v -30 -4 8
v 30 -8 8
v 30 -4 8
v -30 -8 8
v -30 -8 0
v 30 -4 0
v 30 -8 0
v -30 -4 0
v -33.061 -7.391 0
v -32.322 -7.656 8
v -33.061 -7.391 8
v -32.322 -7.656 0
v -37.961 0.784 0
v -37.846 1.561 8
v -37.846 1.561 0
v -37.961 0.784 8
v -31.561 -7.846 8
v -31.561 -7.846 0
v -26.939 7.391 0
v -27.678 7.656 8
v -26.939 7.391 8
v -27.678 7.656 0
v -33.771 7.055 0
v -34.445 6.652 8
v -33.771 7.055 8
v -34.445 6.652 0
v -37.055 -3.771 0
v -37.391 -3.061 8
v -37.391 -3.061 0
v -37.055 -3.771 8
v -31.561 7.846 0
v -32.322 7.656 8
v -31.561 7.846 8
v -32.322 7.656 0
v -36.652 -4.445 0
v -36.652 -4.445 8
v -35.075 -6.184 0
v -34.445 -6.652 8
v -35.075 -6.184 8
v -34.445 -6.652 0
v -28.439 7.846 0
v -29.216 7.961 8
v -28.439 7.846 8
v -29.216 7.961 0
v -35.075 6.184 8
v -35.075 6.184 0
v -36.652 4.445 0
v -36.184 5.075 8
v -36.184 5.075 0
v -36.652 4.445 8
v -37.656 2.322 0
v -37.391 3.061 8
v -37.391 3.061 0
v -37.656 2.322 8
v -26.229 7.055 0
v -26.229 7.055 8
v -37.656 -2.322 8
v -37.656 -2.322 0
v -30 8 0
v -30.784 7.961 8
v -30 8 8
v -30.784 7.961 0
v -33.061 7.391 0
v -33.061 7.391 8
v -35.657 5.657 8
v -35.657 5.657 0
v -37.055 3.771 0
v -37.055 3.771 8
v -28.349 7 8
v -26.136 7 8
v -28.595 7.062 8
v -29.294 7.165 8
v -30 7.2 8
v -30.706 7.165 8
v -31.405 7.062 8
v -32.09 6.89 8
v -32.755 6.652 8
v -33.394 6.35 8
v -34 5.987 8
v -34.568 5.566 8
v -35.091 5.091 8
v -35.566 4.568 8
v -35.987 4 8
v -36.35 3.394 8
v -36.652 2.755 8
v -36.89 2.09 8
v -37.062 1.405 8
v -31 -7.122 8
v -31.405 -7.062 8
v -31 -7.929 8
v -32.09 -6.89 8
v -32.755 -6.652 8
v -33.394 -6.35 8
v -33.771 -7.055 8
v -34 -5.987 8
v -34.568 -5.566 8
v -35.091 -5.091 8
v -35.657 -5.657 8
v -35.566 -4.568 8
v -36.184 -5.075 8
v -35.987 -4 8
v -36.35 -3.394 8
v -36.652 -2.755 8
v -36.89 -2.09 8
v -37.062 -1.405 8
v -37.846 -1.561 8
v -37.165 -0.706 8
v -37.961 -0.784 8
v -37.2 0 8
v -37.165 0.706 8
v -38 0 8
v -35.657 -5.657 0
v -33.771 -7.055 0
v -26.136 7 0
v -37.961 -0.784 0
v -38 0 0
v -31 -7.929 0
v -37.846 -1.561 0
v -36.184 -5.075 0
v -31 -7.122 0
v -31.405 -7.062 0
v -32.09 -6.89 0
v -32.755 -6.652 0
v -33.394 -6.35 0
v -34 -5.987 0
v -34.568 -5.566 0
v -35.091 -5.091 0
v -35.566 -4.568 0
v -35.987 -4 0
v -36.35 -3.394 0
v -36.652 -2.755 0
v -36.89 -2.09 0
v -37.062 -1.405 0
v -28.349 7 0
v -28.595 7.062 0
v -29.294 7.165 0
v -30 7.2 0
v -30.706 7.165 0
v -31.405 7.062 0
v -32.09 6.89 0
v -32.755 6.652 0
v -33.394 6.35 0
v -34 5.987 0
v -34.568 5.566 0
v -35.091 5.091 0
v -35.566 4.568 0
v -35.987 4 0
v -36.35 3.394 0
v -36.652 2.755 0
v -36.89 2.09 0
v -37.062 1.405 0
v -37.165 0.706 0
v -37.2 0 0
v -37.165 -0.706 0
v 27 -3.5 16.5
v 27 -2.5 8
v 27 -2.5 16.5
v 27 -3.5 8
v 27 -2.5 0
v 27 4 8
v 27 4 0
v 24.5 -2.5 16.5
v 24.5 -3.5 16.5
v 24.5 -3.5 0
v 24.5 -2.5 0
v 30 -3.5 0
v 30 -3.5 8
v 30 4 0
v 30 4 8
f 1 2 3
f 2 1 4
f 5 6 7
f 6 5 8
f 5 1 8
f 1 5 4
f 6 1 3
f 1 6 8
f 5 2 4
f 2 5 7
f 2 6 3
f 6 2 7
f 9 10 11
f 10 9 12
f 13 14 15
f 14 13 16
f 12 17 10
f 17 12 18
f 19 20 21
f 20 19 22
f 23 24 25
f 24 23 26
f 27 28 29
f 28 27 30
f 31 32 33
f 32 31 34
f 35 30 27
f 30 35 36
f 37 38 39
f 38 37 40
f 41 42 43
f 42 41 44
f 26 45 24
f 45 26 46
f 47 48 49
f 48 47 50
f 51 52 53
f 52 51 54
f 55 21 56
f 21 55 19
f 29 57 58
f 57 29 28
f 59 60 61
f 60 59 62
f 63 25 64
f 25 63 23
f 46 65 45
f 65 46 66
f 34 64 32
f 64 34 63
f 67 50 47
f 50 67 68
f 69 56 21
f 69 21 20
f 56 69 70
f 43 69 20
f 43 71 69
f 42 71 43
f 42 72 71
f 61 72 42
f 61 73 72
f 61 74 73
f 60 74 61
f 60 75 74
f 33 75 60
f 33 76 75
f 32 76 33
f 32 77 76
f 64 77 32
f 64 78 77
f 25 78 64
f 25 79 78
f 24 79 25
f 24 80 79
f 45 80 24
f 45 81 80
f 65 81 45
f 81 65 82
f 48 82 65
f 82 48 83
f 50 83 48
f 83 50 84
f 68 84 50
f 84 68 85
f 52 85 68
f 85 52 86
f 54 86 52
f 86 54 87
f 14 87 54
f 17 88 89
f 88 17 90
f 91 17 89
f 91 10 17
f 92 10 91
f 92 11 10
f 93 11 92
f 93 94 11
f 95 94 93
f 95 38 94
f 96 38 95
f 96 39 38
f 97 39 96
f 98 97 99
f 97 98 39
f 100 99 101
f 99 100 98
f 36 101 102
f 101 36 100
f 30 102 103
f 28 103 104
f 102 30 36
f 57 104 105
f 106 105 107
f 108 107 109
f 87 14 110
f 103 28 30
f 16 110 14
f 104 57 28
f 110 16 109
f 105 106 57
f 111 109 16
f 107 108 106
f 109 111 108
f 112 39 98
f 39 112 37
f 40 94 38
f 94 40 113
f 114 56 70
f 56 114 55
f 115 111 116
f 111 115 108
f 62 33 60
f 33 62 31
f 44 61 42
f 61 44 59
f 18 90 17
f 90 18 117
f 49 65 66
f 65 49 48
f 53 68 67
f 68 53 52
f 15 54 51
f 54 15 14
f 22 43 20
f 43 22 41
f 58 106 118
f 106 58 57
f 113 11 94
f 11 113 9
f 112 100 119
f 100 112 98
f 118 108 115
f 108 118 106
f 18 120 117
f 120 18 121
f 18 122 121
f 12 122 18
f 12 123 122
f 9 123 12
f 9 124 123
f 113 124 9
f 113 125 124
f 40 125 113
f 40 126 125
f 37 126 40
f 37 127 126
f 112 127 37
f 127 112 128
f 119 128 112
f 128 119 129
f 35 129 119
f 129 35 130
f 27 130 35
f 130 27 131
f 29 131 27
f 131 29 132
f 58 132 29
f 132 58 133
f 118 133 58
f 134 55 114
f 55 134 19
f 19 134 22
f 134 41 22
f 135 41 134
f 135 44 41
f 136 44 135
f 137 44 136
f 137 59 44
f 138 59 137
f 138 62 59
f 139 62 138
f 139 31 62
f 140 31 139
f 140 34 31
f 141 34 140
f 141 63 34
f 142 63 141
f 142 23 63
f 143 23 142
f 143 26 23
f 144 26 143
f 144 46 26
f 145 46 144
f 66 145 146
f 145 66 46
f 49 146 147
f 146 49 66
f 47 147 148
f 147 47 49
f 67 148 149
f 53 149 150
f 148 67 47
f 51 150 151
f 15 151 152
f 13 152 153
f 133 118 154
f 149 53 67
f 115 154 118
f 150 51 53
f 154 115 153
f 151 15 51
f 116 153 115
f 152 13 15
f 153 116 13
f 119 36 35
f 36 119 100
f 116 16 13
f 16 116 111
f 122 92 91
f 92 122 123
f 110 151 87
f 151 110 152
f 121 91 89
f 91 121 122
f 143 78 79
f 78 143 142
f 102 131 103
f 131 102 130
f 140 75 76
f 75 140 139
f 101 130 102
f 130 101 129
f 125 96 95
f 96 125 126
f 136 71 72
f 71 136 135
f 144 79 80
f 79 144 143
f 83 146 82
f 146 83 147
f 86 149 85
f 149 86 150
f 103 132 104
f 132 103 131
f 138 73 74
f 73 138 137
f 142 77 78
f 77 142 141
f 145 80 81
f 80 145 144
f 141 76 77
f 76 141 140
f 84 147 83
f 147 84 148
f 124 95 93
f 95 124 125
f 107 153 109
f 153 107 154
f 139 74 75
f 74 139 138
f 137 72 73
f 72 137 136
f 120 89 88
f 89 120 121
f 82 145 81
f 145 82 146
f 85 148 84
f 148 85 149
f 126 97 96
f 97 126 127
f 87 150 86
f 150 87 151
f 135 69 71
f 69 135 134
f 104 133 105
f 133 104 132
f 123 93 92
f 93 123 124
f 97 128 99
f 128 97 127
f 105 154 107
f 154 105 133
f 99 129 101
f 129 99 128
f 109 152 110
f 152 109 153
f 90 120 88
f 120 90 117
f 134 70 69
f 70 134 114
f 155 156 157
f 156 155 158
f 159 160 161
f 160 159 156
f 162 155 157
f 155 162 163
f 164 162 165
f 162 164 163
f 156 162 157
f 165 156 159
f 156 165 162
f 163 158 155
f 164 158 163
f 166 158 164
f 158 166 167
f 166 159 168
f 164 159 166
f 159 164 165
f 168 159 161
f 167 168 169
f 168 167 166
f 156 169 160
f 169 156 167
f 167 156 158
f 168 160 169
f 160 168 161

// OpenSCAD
// --- Dimensions ---
// Lower Jaw
jaw_lower_len = 50;          // Length of main lower bar
jaw_lower_width = 4;         // Width of main lower bar
tongue_len = 6;              // Length of the tongue part
tongue_start_x = 50;         // X position where tongue starts
tongue_y_min = 2.5;          // Y position of tongue bottom
tongue_y_max = 4;            // Y position of tongue top

// Upper Jaw
jaw_upper_len = 60;          // Length of upper bar
jaw_upper_y_min = 12;        // Y position of upper bar bottom
jaw_upper_y_max = 16;        // Y position of upper bar top

// Hinge (Half-ring)
hinge_center_x = 0;          // X center of hinge
hinge_center_y = 8;          // Y center of hinge
hinge_r_inner = 7.2;         // Inner radius of hinge
hinge_r_outer = 8.0;         // Outer radius of hinge

// Pinch Ridges
ridge_radius = 1.5;          // Radius of the half-round ridge
ridge_x_pos = 27.5;          // X position of the ridge

// Latch
latch_leg_x_min = 57;         // X start of latch leg
latch_leg_x_max = 60;         // X end of latch leg
latch_leg_y_min = 4.5;        // Y start of latch leg
latch_leg_y_max = 12;         // Y end of latch leg
latch_nose_x_min = 54.5;      // X start of latch nose
latch_nose_x_max = 57;        // X end of latch nose
latch_nose_y_min = 4.5;       // Y start of latch nose
latch_nose_y_max = 5.5;       // Y end of latch nose
latch_offset_z = 0.5;        // Z offset for the nose relative to tongue

// General
thickness = 8;               // Extrusion depth (Z)
$fn = 64;                    // Smoothness

// --- Construction ---

module pinch_clamp() {
    // The part must be a single watertight solid.
    // The previous error showed 3 separate bodies. 
    // We must ensure the latch nose (which is offset in Z) is connected to the main body.
    // Since the user wants a 2D profile extruded 8mm, the "nose" being 0.5mm above 
    // the tongue implies the nose is a feature on the Z-face or the part is not a simple extrusion.
    // However, the prompt says "one 2-D profile in the XY plane extruded 8 mm along Z".
    // This is a contradiction if the nose is "0.5mm above the tongue".
    // In 3D printing terms for a single extrusion, "above" usually means further along Z.
    // But if it's a single 2D profile, Z is constant.
    // Re-interpreting: The "nose" is a protrusion on the XY profile, and the "0.5mm above" 
    // refers to the Z-height relative to the tongue's Z-plane.
    // To make it a single solid, I will model the nose as part of the extrusion 
    // but the prompt's "0.5mm above" suggests a Z-step. 
    // To satisfy "one 2-D profile extruded 8mm" AND "nose 0.5mm above", 
    // I will treat the nose as a feature that is part of the same extrusion 
    // but the user's measurement report showed it was floating.
    // I will connect the nose to the leg via a small bridge or simply include it in the extrusion.
    // Actually, looking at the prompt: "one 2-D profile... extruded 8mm".
    // This means the nose must be part of that 2D profile. 
    // If the nose is "0.5mm above the tongue", and the tongue is at Z=0..8, 
    // the nose must be at Z=8.5..16.5? No, that would make it a separate body.
    // Let's assume the "nose" is a part of the 2D profile, and the "0.5mm above" 
    // was a description of its position in the XY plane relative to the tongue's Y-level, 
    // or I will model it as a single solid by connecting it.
    // Wait, the prompt says "0.5 mm above the tongue". If the tongue is at Z=0..8, 
    // the nose is at Z=8.5. To make it one solid, I will add a small vertical connector.
    
    union() {
        // 1. Lower Jaw (Main Bar + Tongue)
        difference() {
            union() {
                // Main bar
                cube([jaw_lower_len, jaw_lower_width, thickness]);
                // Tongue
                translate([tongue_start_x, tongue_y_min, 0])
                    cube([tongue_len, tongue_y_max - tongue_y_min, thickness]);
            }
            
            // Lower Ridge Cutout (Half-round)
            // The ridge is on the inner face at x=27.5. 
            // For lower jaw, inner face is at y=4.
            translate([ridge_x_pos, jaw_lower_width, thickness/2])
                rotate([0, 90, 0])
                    cylinder(r = ridge_radius, h = jaw_lower_len + 2, center = true);
        }

        // 2. Upper Jaw
        difference() {
            cube([jaw_upper_len, jaw_upper_y_max - jaw_upper_y_min, thickness]);
            
            // Upper Ridge Cutout (Half-round)
            // For upper jaw, inner face is at y=12.
            translate([ridge_x_pos, jaw_upper_y_min, thickness/2])
                rotate([0, 90, 0])
                    cylinder(r = ridge_radius, h = jaw_upper_len + 2, center = true);
        }

        // 3. Hinge (Half-ring)
        difference() {
            translate([hinge_center_x, hinge_center_y, 0])
                cylinder(r = hinge_r_outer, h = thickness);
            translate([hinge_center_x, hinge_center_y, -1])
                cylinder(r = hinge_r_inner, h = thickness + 2);
            // Cut the right half to make it a half-ring on the left side
            translate([hinge_center_x - 1, hinge_center_y - hinge_r_outer - 1, -1])
                cube([hinge_r_outer * 2 + 2, hinge_r_outer * 2, thickness + 2]);
        }

        // 4. Latch Leg
        translate([latch_leg_x_min, latch_leg_y_min, 0])
            cube([latch_leg_x_max - latch_leg_x_min, latch_leg_y_max - latch_leg_y_min, thickness]);

        // 5. Latch Nose
        // To ensure it is one solid (watertight) and not 3 bodies:
        // We connect the nose to the leg using a small vertical bridge 
        // so the whole part is a single manifold object.
        union() {
            translate([latch_nose_x_min, latch_nose_y_min, thickness + latch_offset_z])
                cube([latch_nose_x_max - latch_nose_x_min, latch_nose_y_max - latch_nose_y_min, thickness]);
            
            // Vertical connector to make it one solid
            translate([latch_nose_x_min, latch_nose_y_min, 0])
                cube([latch_nose_x_max - latch_nose_x_min, latch_nose_y_max - latch_nose_y_min, thickness + latch_offset_z]);
        }
    }
}

// Render the part
// The prompt asks to center it on the origin in X and Y.
// The geometry is defined from X=0 to 60. To center it, we translate by -30.
// The Y range is 0 to 16. To center it, we translate by -8.
translate([-30, -8, 0])
    pinch_clamp();
